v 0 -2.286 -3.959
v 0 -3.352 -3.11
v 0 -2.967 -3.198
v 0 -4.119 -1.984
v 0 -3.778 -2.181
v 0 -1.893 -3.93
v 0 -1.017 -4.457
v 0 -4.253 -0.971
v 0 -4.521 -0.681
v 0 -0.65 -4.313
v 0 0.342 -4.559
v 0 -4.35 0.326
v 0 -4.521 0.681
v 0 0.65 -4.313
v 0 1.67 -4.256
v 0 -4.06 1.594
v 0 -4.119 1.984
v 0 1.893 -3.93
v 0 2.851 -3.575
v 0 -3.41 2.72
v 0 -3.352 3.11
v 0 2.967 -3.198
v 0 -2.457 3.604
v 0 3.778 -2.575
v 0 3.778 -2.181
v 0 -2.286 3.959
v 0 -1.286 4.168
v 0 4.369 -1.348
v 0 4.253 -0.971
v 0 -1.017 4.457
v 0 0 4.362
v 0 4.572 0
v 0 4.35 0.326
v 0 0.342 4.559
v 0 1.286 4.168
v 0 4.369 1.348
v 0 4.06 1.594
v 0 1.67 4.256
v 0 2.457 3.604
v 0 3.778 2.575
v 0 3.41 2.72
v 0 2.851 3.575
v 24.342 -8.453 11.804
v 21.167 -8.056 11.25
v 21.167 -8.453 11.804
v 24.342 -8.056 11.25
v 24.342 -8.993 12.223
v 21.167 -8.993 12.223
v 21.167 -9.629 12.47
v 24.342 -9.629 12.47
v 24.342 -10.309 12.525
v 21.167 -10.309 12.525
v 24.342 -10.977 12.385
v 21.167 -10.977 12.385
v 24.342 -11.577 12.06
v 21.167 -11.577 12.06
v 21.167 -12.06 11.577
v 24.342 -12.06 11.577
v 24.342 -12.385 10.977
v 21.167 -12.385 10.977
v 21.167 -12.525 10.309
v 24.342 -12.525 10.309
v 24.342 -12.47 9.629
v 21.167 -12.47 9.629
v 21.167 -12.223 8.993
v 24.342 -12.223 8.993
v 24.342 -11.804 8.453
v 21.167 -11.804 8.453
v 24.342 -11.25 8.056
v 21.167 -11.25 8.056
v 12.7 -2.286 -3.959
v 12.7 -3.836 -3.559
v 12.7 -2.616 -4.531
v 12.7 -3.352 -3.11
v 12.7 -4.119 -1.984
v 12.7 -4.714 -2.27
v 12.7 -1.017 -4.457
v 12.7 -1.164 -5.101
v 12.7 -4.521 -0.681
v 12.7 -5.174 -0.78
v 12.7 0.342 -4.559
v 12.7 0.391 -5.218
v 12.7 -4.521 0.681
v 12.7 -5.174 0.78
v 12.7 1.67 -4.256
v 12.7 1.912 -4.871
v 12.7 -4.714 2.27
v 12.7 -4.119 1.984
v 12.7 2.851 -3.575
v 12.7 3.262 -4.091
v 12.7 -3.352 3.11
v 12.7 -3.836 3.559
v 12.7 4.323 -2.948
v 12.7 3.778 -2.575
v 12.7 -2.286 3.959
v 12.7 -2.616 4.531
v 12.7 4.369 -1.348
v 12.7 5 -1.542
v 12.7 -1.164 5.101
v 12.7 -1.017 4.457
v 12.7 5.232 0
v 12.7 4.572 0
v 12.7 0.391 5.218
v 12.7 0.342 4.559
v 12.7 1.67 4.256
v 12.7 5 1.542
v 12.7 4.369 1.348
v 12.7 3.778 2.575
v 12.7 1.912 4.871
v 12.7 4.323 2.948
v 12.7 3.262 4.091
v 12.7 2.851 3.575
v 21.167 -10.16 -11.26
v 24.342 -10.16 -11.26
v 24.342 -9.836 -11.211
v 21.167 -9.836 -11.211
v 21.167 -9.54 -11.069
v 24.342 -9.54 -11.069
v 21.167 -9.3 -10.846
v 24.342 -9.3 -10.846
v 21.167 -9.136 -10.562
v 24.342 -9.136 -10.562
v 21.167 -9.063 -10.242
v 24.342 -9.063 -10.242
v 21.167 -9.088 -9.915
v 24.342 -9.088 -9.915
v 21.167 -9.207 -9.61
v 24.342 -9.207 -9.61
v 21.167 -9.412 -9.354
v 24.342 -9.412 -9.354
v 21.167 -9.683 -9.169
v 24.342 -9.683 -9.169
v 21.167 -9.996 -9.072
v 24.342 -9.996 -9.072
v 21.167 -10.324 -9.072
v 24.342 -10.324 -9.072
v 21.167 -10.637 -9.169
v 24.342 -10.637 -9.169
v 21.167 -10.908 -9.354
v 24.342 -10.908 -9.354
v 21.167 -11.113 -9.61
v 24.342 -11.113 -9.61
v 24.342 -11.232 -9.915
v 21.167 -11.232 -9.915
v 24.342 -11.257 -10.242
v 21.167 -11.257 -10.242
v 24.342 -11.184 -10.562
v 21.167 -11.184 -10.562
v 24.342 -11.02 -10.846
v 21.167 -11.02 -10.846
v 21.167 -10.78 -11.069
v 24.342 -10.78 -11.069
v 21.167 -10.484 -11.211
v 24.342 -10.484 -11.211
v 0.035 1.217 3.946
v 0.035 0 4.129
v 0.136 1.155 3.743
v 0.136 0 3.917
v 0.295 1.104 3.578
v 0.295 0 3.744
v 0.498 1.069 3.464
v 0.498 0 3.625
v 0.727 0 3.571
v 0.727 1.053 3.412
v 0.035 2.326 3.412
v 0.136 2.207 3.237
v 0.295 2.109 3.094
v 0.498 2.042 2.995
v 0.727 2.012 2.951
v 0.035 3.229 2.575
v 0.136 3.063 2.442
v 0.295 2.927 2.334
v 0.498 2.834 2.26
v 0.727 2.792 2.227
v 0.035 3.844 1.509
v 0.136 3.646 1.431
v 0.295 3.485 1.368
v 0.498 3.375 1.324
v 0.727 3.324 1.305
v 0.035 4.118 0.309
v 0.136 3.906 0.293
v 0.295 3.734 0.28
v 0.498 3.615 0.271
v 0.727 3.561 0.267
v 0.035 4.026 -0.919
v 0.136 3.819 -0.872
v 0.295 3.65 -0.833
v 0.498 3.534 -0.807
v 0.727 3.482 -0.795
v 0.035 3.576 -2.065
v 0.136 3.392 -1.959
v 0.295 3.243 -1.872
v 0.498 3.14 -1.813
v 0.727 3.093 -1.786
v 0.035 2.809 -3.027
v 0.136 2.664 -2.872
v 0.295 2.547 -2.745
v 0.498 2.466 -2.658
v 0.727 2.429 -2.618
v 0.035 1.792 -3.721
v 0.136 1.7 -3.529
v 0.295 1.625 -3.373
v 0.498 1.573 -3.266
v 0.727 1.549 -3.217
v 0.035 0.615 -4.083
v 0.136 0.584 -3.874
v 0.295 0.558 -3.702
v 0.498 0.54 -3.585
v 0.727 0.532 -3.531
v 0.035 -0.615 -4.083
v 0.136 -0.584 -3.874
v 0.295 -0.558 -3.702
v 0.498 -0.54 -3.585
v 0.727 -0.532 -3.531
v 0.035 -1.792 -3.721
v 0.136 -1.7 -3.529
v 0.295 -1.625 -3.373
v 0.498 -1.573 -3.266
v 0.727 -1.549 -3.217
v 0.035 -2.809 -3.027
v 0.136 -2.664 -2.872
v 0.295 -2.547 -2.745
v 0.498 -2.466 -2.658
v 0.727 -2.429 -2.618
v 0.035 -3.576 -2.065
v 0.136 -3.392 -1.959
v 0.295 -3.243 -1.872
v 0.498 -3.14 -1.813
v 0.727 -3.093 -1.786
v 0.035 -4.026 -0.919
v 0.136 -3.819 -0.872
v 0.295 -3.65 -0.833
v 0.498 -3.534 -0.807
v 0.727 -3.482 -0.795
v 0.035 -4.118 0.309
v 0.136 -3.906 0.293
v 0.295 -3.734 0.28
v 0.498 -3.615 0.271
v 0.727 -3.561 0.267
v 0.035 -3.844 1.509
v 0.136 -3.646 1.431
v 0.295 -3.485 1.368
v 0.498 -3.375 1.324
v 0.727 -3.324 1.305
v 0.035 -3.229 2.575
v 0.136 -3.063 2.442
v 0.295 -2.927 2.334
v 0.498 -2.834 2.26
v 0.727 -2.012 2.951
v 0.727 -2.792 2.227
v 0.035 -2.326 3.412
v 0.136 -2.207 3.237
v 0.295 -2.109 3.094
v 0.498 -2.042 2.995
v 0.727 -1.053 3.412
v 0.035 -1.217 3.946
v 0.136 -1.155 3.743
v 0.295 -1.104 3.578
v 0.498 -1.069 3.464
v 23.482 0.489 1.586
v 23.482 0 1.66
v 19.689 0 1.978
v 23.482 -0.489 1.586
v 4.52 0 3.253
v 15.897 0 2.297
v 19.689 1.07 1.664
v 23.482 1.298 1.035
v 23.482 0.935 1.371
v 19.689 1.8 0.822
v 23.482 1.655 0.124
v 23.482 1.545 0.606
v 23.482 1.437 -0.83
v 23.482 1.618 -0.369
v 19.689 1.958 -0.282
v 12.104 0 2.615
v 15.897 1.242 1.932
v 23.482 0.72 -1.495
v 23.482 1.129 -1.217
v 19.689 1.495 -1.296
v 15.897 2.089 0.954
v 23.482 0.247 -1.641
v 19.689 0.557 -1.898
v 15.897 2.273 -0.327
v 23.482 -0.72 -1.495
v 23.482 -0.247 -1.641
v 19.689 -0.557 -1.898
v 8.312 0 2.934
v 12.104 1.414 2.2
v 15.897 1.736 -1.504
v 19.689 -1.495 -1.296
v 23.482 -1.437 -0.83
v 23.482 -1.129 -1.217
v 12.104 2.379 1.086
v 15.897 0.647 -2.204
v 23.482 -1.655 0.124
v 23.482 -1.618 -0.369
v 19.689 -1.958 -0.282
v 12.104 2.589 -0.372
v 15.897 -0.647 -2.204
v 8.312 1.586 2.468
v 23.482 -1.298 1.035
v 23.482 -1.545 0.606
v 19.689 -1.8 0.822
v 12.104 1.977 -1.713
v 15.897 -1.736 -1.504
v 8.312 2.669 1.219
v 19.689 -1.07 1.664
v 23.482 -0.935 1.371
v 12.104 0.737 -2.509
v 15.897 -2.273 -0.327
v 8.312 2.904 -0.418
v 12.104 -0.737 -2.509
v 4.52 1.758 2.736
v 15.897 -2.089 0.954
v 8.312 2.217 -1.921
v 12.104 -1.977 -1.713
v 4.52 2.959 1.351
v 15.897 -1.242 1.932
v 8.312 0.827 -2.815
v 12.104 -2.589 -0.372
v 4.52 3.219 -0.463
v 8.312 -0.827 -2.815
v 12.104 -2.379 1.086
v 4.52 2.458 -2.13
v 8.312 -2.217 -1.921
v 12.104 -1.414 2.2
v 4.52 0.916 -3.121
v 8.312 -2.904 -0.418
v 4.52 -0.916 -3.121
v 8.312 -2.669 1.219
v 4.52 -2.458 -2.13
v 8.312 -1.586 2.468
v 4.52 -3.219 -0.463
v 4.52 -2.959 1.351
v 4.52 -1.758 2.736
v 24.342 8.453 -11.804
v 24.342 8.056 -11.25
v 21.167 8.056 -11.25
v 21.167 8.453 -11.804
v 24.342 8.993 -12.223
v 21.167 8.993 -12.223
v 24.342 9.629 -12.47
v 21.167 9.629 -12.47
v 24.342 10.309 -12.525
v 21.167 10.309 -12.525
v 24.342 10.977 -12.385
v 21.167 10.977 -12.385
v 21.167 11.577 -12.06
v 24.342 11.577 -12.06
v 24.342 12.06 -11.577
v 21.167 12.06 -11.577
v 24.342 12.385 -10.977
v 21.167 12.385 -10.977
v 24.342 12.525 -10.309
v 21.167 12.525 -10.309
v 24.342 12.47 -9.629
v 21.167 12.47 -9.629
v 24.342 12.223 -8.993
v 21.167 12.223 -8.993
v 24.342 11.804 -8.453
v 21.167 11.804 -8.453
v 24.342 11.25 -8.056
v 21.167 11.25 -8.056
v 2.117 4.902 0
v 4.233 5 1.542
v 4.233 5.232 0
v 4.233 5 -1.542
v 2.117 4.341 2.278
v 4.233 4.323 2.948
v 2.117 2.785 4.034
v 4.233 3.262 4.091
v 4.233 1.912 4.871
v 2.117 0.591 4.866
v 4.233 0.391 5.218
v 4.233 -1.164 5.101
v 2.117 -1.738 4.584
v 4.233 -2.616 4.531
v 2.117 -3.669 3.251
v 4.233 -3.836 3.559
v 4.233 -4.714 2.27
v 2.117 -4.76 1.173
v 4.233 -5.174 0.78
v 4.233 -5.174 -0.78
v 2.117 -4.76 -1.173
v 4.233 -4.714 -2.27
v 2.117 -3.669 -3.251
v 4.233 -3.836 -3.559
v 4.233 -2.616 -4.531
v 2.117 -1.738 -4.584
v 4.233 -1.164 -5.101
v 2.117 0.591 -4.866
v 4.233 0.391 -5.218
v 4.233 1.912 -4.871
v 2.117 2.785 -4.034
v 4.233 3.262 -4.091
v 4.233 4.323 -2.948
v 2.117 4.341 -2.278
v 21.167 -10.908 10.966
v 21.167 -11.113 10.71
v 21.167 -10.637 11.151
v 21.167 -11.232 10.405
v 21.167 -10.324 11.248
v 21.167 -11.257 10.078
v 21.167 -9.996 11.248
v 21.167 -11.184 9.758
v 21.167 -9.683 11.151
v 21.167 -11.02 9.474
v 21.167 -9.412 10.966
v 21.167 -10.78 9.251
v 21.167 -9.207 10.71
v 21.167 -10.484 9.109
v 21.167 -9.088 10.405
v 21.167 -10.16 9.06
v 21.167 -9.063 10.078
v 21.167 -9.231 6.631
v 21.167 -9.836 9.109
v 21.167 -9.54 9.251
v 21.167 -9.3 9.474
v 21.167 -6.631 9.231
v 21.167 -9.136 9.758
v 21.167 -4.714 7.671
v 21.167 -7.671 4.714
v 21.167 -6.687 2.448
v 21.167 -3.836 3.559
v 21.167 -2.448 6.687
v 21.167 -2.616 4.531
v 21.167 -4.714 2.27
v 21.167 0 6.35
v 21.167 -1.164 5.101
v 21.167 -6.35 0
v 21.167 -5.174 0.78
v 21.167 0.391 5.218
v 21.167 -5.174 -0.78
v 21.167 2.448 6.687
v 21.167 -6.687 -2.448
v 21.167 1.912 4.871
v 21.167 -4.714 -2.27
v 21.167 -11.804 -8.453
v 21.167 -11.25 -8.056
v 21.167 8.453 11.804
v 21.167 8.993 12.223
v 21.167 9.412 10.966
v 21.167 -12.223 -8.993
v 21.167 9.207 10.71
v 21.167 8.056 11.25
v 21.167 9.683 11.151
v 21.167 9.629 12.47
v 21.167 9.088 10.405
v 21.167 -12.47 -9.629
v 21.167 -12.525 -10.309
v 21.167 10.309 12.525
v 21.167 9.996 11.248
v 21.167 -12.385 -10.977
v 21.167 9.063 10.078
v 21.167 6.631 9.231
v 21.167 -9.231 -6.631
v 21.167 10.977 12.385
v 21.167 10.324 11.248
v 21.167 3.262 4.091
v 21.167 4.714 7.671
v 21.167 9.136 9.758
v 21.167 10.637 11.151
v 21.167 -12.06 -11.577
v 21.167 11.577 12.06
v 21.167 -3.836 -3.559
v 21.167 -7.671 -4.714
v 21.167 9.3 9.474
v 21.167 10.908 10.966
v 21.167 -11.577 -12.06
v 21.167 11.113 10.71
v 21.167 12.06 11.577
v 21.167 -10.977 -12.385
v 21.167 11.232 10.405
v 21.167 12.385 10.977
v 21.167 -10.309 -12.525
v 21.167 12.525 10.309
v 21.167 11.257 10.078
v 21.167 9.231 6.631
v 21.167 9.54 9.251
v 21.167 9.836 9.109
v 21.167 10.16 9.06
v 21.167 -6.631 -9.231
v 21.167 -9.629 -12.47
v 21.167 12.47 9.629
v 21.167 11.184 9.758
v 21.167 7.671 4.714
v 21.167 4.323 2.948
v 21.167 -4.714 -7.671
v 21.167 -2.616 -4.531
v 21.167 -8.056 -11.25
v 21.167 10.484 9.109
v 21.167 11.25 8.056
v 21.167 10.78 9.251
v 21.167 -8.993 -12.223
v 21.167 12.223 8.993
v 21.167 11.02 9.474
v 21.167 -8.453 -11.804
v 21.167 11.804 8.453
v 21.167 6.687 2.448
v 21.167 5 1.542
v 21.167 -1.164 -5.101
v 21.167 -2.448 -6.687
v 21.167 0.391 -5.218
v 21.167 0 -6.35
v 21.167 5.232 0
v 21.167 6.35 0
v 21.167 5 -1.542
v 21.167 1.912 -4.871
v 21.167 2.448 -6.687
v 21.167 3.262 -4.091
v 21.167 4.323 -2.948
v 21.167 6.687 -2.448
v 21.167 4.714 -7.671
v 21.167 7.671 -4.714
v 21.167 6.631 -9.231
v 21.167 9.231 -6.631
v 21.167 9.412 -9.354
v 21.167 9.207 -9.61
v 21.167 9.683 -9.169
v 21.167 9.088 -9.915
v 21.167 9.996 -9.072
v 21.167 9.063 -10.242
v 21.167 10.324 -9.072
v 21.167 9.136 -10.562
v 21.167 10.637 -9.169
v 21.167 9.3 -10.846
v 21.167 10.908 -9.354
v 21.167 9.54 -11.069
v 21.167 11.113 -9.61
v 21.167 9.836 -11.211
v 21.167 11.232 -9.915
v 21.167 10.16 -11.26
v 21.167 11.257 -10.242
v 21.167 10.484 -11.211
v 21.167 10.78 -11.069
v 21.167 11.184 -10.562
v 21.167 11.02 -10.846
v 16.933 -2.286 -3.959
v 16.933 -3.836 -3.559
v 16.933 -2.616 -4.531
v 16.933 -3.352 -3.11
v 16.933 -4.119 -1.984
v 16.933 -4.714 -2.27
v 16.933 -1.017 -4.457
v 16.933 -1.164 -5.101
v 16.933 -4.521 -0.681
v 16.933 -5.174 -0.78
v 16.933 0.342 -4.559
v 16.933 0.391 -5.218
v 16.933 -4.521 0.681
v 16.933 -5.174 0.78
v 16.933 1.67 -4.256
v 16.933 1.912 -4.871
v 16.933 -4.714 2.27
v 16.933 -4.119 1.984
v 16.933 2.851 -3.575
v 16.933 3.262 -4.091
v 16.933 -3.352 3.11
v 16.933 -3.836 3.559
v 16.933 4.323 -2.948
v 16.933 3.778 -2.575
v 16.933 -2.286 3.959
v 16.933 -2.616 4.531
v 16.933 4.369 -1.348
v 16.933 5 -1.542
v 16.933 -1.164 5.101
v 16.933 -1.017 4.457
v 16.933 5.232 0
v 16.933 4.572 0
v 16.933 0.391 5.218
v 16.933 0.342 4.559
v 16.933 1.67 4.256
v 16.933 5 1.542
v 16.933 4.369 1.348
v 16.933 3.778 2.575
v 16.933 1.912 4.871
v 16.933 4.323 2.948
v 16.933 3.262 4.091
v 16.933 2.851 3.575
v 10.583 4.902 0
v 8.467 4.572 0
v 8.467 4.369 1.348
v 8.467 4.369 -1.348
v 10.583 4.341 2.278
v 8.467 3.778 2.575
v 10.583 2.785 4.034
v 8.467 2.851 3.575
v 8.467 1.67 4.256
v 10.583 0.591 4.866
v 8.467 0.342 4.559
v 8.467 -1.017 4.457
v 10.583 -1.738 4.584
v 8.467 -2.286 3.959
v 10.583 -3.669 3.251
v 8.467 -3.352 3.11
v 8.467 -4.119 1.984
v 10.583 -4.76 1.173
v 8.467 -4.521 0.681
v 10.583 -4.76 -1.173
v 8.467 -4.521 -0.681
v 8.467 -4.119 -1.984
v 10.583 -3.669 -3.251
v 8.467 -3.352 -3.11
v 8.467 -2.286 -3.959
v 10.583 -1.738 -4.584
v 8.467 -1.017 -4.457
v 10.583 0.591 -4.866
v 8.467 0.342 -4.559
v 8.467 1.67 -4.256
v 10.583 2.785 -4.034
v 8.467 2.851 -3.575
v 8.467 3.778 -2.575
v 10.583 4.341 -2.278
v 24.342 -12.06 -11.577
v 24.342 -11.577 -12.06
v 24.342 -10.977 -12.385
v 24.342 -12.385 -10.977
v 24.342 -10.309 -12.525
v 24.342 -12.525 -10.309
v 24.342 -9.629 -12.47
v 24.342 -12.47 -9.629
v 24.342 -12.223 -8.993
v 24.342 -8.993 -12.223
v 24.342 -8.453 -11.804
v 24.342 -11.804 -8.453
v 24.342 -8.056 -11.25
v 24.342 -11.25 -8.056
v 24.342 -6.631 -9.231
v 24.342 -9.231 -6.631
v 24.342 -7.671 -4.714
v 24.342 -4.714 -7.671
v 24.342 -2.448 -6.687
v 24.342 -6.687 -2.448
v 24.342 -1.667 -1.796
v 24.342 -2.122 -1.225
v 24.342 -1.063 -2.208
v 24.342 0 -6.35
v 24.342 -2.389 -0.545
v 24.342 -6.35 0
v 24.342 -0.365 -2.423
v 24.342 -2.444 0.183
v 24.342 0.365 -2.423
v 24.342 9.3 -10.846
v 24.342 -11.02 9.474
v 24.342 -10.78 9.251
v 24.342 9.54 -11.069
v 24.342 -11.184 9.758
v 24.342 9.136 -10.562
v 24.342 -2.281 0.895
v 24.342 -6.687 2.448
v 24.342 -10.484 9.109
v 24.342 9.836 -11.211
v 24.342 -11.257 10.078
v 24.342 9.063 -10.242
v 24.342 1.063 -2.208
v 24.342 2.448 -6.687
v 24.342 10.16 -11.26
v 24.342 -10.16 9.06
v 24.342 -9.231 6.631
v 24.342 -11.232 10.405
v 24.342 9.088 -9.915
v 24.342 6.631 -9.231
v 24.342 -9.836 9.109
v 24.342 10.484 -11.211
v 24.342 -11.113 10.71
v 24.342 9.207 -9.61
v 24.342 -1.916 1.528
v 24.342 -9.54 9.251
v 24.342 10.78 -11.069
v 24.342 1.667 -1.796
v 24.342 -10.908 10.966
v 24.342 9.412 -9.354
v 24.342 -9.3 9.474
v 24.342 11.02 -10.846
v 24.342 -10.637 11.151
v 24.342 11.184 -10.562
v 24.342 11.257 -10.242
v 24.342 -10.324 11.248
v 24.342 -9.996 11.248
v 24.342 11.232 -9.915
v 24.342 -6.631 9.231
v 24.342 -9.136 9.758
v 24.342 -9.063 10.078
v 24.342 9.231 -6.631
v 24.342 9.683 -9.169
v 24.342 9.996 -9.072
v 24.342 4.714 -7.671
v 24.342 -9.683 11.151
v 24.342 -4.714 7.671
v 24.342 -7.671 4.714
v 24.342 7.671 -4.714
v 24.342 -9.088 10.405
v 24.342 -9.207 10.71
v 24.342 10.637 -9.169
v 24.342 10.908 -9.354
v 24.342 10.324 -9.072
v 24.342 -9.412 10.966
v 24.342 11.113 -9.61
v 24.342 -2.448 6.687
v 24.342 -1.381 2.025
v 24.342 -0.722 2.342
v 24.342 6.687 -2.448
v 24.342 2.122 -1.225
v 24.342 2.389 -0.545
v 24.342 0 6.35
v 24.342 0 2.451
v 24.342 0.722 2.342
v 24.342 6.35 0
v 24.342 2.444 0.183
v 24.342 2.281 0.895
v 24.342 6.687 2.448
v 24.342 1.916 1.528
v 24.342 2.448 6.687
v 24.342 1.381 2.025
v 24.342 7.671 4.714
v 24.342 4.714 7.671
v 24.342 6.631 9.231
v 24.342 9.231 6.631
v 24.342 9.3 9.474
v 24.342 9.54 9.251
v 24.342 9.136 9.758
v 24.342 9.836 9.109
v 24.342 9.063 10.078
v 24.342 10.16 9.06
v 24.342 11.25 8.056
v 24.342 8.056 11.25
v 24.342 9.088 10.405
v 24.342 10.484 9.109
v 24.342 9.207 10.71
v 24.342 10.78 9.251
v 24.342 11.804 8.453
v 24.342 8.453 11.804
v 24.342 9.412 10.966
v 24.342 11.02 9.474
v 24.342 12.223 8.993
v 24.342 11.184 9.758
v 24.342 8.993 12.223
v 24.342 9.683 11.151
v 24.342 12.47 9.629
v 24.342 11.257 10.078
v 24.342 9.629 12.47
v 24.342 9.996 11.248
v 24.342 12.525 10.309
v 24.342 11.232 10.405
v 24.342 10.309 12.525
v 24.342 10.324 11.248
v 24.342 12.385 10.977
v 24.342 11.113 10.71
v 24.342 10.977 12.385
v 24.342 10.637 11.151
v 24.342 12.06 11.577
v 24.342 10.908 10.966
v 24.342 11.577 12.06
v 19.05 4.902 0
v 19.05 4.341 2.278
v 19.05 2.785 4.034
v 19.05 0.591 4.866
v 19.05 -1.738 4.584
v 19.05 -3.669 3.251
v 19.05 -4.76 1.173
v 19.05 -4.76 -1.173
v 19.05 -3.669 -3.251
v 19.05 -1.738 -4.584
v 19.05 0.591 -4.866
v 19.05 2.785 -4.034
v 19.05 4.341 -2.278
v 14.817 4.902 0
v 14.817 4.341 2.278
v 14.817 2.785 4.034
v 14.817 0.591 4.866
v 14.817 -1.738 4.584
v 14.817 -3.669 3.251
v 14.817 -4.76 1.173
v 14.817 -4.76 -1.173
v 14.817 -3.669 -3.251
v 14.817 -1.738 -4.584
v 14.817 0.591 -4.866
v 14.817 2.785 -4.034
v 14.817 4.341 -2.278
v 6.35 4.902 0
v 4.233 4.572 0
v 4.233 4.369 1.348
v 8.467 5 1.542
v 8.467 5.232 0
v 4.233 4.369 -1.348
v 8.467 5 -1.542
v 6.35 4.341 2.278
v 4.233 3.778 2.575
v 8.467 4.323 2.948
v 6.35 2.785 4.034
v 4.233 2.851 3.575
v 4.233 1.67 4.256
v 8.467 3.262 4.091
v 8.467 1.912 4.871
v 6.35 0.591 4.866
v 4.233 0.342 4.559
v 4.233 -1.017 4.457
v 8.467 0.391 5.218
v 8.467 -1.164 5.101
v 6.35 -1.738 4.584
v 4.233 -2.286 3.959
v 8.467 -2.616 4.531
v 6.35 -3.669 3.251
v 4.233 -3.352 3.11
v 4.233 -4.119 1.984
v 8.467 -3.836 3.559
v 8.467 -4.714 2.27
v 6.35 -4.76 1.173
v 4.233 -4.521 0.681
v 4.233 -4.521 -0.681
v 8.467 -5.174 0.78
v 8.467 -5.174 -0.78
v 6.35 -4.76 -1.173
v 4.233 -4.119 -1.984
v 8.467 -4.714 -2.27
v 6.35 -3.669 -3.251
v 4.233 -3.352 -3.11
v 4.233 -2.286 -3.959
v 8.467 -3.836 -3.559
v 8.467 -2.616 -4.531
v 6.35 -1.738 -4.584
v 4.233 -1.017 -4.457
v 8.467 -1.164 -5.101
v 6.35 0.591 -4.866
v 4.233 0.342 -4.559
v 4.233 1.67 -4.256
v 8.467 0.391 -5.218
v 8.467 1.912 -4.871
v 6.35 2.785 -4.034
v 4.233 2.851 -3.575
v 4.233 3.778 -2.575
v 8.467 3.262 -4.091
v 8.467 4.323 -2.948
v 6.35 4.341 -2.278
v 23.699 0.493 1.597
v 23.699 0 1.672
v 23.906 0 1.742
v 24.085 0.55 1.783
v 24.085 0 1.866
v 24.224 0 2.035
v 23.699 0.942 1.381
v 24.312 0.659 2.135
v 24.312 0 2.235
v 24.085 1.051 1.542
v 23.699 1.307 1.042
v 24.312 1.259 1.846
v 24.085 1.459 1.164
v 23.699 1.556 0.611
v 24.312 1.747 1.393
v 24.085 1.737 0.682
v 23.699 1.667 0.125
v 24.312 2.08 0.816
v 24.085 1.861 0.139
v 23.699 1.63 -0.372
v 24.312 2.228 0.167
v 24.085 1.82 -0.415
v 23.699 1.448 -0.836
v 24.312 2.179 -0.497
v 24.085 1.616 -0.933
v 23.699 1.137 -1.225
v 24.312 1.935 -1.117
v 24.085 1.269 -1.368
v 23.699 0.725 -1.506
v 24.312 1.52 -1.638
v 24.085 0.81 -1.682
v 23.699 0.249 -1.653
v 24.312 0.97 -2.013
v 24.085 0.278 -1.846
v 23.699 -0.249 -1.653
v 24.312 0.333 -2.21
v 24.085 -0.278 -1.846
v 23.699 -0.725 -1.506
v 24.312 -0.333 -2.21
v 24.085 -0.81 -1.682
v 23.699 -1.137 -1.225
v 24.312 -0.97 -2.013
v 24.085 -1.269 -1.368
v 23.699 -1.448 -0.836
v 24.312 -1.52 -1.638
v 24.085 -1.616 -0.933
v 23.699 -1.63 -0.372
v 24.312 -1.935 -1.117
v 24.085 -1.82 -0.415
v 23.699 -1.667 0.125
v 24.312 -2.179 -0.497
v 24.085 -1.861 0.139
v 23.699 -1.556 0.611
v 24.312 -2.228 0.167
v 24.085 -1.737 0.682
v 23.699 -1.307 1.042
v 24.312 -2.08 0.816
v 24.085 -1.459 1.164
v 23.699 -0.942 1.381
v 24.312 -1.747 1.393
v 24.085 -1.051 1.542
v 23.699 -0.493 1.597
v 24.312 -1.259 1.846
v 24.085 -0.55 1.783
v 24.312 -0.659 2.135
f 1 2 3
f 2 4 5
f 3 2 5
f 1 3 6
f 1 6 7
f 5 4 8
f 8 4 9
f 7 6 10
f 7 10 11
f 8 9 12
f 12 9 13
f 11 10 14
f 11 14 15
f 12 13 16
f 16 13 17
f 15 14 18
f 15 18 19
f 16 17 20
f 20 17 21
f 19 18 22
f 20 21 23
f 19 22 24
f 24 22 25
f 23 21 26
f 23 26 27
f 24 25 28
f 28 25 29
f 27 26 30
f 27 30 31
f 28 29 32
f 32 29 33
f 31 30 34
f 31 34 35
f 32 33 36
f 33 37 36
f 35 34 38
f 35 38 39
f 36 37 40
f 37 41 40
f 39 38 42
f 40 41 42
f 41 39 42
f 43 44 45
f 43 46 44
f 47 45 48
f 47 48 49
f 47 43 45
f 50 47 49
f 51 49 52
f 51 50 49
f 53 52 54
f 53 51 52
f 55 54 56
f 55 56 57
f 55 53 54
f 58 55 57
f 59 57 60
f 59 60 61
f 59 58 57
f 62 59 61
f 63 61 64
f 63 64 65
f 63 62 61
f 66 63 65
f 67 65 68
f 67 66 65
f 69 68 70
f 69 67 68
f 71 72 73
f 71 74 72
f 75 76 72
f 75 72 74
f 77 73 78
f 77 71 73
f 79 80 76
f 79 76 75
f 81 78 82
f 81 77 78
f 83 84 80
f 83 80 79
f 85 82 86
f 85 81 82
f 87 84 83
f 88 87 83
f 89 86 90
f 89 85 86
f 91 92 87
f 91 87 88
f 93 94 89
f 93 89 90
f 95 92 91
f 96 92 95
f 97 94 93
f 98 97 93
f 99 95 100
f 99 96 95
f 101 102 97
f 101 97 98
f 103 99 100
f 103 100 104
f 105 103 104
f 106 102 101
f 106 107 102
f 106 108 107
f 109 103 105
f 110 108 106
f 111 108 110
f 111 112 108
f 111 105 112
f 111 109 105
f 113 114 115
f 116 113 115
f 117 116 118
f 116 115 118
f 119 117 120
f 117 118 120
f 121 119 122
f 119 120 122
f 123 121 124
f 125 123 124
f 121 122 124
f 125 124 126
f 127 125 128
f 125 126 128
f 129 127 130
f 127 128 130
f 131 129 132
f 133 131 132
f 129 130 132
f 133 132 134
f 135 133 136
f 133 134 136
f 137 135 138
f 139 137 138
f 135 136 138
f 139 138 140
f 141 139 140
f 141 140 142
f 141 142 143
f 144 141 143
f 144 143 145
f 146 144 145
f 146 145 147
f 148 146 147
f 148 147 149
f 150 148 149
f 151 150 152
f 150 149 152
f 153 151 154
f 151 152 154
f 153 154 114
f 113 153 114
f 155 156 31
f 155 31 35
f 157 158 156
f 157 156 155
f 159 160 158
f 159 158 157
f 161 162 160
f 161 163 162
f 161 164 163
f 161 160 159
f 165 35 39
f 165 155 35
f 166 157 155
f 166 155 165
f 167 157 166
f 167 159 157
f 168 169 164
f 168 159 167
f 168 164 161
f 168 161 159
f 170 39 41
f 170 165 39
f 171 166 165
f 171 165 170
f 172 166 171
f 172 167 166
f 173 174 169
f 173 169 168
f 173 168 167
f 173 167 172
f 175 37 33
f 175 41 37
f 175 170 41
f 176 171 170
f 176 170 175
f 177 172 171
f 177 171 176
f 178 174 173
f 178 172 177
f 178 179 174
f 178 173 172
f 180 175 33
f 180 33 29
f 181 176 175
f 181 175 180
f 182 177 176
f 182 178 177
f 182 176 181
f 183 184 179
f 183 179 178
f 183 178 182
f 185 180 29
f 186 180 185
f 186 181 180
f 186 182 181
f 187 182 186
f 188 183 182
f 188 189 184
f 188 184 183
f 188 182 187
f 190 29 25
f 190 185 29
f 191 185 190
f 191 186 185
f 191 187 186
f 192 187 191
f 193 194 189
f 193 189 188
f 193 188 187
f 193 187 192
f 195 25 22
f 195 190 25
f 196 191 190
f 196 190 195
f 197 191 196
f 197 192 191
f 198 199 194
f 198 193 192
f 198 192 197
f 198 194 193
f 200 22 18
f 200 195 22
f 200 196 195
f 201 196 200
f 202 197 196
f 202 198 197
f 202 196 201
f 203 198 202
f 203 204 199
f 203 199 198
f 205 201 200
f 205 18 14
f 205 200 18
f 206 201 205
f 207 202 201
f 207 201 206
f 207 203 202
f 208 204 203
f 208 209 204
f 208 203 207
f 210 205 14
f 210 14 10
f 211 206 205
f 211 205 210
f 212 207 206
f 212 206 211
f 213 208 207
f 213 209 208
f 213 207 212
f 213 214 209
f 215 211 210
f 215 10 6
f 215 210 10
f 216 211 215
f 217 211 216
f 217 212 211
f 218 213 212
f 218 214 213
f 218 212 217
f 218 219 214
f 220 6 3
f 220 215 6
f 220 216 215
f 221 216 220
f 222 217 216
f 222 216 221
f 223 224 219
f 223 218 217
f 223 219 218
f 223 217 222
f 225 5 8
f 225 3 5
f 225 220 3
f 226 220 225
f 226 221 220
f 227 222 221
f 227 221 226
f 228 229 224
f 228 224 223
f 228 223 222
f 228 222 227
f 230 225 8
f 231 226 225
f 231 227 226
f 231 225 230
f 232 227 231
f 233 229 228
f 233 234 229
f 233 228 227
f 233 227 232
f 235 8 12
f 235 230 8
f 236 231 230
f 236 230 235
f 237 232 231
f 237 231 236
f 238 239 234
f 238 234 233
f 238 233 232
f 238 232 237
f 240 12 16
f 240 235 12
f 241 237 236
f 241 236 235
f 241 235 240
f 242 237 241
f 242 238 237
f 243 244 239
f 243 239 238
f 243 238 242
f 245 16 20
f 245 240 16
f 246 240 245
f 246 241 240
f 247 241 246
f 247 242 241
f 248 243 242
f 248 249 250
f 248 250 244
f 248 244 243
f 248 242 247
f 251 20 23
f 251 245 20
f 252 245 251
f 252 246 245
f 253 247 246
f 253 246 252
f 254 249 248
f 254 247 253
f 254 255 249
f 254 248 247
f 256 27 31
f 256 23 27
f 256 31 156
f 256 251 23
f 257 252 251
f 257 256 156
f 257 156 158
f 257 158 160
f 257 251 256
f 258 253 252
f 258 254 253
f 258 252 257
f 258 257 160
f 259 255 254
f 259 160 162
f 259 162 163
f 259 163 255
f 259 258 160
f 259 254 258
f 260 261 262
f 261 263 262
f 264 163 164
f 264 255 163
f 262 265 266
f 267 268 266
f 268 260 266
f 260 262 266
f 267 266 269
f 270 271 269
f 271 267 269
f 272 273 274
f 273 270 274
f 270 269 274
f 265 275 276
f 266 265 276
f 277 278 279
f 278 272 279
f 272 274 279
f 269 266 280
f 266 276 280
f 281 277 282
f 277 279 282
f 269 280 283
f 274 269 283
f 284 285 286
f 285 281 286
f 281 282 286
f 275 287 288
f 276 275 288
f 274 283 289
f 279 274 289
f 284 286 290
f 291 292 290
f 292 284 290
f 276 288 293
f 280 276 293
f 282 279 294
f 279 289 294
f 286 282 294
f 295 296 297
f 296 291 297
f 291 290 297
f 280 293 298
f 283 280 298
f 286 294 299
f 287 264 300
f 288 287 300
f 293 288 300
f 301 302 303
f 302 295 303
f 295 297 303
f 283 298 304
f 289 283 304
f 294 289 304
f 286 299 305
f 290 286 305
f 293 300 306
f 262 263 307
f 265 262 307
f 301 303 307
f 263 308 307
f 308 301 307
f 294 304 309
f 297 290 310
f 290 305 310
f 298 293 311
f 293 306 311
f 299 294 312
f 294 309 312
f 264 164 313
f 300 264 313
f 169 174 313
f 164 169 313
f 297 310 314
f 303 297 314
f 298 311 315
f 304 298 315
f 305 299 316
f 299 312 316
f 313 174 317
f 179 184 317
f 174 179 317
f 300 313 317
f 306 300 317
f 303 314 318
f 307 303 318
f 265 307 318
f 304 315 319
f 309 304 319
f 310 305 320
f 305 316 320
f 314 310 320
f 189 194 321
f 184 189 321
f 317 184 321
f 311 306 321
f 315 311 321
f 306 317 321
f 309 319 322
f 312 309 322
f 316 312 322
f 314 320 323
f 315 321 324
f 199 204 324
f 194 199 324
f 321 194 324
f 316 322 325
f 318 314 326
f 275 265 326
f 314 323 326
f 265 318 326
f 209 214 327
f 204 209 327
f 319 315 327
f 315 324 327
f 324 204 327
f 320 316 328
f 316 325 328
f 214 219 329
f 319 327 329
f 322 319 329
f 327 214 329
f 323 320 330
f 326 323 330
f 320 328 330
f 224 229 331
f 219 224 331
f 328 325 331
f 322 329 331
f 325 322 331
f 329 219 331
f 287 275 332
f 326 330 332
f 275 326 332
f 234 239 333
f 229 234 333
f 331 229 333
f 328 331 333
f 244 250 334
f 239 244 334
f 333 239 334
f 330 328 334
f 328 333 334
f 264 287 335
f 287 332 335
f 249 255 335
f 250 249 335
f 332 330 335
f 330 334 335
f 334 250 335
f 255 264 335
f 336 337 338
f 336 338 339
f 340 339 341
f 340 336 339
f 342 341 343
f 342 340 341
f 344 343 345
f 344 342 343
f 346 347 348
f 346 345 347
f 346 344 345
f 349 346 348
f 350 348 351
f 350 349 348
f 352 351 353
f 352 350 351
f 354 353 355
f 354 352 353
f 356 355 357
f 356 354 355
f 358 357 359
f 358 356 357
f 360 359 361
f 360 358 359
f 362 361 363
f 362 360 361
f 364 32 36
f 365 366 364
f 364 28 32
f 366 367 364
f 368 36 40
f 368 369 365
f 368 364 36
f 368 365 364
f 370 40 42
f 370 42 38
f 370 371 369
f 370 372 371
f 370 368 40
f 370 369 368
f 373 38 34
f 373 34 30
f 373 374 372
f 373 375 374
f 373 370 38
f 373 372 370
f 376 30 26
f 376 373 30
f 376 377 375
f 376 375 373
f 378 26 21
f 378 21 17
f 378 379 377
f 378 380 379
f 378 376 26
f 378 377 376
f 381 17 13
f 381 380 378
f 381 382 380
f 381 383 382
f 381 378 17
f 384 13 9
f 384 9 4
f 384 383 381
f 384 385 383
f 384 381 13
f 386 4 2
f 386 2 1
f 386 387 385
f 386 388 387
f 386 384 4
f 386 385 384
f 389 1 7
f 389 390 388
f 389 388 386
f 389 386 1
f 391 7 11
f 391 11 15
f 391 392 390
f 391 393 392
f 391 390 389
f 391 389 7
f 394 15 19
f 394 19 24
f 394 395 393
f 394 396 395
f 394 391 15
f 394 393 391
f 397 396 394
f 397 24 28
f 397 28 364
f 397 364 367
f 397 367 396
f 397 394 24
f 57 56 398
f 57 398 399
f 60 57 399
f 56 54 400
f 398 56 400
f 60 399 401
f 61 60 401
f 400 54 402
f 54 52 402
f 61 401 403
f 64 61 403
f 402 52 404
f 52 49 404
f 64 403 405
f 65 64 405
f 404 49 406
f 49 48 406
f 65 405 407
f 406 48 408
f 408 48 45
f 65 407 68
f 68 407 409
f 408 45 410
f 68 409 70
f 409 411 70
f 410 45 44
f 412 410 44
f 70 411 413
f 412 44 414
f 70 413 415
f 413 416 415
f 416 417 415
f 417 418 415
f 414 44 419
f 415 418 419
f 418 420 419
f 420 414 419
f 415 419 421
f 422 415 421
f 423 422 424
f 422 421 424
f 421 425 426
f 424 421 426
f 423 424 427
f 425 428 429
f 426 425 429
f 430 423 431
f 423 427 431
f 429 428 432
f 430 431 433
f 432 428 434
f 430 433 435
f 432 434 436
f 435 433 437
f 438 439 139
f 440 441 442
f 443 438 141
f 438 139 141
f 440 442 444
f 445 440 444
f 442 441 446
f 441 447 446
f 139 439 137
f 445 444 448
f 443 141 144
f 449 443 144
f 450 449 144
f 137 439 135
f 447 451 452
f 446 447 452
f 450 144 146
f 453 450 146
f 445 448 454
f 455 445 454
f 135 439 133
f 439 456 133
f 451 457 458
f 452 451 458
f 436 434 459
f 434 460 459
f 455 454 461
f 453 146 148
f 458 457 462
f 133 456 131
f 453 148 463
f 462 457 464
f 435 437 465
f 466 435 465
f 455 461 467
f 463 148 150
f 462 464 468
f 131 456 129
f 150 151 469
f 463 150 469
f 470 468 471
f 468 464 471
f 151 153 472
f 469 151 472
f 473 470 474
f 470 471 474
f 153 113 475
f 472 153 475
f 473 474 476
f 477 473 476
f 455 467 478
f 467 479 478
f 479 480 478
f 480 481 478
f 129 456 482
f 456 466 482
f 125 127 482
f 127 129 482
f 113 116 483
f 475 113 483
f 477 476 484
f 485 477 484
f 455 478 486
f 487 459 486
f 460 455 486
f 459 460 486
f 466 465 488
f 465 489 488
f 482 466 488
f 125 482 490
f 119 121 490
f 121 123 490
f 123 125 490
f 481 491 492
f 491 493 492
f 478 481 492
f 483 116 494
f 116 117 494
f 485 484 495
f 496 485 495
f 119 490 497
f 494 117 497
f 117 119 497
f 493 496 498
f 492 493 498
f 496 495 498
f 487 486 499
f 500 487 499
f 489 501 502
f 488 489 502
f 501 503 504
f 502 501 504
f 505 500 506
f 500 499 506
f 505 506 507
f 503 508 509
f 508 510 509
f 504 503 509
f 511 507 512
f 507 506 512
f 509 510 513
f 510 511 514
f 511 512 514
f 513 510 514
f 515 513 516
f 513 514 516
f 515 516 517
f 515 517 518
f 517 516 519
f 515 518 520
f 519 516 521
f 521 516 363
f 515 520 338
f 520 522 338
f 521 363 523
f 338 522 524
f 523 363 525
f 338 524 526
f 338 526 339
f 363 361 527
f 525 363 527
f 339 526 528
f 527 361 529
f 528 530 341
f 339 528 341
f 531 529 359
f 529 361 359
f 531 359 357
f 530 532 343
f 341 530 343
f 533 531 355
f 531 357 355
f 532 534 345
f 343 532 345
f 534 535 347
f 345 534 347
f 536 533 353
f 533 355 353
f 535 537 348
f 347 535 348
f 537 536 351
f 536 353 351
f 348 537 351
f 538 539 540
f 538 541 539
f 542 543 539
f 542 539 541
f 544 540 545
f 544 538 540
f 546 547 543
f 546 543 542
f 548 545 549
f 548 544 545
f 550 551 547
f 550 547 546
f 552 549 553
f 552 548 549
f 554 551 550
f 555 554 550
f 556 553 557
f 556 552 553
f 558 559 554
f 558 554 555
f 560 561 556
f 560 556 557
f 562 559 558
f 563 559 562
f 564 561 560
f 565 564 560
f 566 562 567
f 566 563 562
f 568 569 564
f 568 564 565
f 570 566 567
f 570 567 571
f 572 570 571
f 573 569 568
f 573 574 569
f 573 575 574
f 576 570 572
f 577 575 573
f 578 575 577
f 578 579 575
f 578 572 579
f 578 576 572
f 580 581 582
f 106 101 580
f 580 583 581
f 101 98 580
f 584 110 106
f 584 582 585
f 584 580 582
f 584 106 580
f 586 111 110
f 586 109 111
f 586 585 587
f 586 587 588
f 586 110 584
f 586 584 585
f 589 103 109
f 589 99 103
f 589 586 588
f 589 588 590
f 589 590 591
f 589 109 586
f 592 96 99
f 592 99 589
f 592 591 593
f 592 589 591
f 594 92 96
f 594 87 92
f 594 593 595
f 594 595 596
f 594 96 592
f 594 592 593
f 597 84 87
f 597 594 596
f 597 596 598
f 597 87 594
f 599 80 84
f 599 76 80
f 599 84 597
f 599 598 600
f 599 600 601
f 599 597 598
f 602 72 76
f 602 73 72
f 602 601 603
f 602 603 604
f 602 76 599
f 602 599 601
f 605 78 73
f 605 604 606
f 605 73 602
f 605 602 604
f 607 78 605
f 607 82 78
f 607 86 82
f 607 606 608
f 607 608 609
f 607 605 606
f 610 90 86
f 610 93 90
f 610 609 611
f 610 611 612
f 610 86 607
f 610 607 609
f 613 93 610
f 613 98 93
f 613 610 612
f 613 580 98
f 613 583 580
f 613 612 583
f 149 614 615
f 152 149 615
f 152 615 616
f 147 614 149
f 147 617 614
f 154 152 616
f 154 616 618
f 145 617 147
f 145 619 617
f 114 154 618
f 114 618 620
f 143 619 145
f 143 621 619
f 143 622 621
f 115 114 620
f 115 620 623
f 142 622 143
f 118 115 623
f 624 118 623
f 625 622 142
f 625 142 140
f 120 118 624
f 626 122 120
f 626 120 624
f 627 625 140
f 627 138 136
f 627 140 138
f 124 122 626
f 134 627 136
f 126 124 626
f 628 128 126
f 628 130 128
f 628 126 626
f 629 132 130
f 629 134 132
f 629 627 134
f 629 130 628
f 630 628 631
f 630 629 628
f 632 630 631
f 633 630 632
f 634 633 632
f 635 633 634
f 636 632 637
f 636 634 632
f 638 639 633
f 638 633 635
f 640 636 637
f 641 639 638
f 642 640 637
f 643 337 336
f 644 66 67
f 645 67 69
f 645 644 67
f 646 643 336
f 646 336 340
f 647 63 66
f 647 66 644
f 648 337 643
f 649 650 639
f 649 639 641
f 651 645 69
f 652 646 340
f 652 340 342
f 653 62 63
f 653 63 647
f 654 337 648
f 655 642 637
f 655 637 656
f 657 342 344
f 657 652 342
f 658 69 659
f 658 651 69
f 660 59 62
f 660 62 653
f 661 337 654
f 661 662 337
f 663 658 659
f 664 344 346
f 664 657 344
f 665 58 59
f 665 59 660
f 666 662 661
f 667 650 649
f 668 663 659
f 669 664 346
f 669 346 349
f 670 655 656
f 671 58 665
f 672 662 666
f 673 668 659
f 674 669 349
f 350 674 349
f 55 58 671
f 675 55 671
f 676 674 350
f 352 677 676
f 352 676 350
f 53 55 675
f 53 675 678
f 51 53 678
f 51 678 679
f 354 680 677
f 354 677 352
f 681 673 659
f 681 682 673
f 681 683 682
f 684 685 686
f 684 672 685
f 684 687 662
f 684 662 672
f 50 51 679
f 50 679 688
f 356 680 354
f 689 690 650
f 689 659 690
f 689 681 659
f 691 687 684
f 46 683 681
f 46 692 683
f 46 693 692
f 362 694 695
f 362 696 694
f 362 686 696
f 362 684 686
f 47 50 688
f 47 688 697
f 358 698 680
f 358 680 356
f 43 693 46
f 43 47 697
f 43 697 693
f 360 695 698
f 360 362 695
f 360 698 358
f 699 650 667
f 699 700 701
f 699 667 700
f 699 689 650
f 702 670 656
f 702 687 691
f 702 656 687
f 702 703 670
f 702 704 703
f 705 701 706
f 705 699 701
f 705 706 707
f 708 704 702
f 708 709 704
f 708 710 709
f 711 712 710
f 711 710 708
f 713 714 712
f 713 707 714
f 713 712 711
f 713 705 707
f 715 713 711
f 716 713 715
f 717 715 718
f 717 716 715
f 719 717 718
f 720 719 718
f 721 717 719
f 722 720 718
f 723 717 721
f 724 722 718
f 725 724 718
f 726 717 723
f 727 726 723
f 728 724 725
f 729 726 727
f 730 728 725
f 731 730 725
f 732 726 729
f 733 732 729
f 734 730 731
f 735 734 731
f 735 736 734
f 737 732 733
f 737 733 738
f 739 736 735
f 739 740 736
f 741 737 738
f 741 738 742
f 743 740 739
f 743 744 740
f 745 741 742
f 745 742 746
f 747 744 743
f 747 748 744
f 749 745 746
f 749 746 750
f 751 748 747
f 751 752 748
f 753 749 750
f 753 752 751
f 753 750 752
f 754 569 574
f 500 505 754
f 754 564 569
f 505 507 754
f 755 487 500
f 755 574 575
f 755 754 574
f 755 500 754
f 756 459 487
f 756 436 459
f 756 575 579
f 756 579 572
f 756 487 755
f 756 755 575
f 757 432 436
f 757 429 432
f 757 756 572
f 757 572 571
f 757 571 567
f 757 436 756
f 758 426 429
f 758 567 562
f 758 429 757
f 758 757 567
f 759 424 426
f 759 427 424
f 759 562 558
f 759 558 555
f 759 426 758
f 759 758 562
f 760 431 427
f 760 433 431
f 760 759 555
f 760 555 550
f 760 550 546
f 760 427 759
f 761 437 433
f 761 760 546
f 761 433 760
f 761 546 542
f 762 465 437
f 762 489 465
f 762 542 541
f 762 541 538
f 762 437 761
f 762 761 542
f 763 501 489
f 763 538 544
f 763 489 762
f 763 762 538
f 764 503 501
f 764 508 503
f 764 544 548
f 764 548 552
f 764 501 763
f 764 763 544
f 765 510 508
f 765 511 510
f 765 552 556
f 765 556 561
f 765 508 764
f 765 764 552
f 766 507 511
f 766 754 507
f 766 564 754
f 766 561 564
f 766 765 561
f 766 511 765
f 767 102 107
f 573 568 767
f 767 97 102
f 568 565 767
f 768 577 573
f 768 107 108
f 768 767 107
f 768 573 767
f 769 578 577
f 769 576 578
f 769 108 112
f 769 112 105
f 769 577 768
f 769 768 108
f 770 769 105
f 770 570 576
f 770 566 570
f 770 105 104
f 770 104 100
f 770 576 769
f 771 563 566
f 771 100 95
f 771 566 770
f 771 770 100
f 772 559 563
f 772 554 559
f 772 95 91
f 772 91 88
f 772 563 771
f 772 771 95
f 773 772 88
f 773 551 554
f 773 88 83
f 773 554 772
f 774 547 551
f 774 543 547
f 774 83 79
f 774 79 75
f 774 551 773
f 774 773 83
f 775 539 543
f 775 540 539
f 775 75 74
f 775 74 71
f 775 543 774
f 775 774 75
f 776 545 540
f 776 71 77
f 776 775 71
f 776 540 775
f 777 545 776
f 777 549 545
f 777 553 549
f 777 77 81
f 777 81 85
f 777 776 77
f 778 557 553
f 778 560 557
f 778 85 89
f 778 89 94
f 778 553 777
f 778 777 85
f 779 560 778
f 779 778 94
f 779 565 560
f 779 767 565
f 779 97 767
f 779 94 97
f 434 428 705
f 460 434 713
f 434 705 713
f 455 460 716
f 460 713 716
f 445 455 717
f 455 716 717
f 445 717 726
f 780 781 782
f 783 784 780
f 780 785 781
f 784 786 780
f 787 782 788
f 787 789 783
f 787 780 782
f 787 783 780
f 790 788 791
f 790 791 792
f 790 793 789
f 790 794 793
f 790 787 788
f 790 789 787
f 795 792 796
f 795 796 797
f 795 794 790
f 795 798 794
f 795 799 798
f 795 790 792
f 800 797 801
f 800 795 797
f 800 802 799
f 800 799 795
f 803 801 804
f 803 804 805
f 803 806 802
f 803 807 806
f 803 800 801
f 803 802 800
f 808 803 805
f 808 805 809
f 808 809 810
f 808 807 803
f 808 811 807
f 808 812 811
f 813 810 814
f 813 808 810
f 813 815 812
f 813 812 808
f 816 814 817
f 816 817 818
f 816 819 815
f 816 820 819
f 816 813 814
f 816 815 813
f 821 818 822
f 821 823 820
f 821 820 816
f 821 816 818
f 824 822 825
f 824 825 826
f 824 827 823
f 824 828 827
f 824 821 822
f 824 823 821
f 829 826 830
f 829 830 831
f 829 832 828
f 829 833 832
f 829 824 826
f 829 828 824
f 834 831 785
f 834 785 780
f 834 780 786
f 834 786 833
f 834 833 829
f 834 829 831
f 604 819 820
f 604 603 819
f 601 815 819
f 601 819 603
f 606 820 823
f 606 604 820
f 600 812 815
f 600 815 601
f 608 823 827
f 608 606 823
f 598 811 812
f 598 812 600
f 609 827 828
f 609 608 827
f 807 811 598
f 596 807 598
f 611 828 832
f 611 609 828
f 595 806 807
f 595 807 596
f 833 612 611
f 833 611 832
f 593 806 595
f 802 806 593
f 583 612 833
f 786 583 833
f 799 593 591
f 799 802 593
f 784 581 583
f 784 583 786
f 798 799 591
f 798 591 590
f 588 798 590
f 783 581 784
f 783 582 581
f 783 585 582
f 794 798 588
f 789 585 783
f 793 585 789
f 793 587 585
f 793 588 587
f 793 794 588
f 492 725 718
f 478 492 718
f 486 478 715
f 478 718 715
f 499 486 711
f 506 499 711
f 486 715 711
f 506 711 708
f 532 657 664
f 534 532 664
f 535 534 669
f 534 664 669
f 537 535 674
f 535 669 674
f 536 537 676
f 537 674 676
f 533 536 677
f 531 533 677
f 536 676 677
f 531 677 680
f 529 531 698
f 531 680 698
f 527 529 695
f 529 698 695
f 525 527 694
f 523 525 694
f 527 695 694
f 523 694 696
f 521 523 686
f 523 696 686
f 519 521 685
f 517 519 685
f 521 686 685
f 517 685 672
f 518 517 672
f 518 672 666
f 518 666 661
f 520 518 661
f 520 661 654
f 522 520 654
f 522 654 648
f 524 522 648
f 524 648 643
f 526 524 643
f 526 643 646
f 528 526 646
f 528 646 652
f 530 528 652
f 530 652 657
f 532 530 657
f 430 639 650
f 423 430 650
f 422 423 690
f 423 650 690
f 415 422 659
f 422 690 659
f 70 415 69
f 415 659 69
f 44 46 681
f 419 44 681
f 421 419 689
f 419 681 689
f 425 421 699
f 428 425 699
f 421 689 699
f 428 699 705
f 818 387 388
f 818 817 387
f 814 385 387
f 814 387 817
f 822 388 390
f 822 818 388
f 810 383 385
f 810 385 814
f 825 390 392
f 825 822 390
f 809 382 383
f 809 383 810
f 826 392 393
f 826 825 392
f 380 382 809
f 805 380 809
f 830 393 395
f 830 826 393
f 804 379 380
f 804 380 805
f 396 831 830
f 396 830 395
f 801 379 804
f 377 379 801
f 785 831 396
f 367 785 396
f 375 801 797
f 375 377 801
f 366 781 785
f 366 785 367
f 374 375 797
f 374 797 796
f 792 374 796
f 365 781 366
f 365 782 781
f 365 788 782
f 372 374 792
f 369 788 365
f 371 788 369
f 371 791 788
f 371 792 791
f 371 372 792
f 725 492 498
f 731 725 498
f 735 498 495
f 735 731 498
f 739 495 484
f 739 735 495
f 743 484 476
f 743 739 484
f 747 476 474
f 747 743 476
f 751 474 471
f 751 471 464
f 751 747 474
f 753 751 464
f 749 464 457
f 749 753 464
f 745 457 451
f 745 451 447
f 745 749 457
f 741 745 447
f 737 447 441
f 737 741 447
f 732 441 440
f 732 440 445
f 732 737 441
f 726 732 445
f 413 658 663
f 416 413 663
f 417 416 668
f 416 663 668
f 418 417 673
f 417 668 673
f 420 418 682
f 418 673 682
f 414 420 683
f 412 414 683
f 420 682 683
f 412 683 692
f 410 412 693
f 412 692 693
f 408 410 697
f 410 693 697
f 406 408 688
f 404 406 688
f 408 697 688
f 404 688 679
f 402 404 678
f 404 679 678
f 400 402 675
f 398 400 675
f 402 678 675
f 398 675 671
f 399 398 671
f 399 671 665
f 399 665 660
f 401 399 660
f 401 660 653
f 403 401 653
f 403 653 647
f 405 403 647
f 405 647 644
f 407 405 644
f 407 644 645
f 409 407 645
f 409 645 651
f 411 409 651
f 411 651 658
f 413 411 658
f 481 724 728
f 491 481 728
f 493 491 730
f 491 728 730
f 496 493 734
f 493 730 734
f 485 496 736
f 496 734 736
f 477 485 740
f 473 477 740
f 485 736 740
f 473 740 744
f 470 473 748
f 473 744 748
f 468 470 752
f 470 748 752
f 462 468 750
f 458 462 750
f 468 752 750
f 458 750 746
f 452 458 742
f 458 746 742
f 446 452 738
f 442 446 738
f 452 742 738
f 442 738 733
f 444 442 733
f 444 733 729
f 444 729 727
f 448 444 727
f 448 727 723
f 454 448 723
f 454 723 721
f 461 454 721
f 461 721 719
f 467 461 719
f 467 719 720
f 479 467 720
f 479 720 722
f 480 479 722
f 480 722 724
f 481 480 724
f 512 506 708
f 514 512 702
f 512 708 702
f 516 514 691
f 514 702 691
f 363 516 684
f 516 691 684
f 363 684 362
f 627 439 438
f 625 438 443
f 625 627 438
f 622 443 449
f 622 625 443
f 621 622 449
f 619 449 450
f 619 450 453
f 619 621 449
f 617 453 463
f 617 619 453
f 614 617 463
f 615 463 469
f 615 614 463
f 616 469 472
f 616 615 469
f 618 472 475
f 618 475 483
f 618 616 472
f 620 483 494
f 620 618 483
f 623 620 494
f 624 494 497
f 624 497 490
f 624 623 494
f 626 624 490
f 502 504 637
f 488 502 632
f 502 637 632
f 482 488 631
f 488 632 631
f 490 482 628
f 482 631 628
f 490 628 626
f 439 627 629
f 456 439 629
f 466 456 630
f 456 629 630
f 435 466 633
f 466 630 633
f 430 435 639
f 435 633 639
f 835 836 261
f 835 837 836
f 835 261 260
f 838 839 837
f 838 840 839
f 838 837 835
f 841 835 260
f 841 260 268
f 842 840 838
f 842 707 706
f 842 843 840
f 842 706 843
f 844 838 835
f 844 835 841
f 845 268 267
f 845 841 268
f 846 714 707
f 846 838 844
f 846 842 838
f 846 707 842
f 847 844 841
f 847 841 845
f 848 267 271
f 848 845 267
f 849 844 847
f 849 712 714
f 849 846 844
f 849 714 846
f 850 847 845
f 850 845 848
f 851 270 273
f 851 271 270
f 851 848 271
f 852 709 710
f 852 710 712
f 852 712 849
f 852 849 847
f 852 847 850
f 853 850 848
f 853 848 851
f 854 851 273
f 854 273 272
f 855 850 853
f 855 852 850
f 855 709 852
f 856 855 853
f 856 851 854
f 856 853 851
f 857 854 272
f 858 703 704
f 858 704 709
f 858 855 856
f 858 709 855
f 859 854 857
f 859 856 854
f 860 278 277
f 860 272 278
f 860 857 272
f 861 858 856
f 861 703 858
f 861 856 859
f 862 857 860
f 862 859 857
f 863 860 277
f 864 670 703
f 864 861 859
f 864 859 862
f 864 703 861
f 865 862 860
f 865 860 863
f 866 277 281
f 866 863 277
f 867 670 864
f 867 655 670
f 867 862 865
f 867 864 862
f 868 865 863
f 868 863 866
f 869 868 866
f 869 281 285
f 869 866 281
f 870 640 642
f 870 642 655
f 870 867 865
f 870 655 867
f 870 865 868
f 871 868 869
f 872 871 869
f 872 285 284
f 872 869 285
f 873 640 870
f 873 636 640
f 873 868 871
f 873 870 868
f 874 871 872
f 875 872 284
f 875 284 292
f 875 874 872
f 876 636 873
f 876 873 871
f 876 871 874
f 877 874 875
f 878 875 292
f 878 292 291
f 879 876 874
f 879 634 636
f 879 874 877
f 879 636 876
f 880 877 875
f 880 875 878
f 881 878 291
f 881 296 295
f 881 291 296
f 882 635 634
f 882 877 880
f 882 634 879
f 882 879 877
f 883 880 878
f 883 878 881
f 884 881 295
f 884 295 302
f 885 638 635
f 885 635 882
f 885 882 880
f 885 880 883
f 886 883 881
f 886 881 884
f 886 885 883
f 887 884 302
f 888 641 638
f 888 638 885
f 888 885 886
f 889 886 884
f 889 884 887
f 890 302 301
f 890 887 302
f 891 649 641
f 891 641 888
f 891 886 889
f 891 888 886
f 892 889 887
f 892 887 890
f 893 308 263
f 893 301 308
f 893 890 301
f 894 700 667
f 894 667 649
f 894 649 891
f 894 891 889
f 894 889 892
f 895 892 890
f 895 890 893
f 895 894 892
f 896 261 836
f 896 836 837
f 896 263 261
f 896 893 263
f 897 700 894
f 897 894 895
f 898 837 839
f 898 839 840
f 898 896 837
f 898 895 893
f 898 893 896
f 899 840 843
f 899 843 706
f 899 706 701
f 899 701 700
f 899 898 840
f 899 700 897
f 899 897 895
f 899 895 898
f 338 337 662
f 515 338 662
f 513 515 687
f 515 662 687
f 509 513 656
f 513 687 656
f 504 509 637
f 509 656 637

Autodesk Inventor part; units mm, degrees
ref_plane "YZ Plane" through (0, 0, 0) normal (1, 0, 0) x (0, 1, 0)
ref_plane "XZ Plane" through (0, 0, 0) normal (0, 1, 0) x (-1, 0, 0)
ref_plane "XY Plane" through (0, 0, 0) normal (0, 0, 1) x (1, 0, 0)
sketch "Sketch3" plane through (0, 0, 0) normal (0, 0, 1) x (1, 0, 0)
  line L0 (0, 0) -> (0, 4.572)
  line L1 (0, 4.572) -> (4.2333, 5.2324)
  line L2 (0, 0) -> (21.1667, 0)
  line L3 (4.2333, 5.2324) -> (4.2333, 4.572)
  line L4 (4.2333, 4.572) -> (8.4667, 5.2324)
  line L5 (8.4667, 5.2324) -> (8.4667, 4.572)
  line L6 (8.4667, 4.572) -> (12.7, 5.2324)
  line L7 (12.7, 5.2324) -> (12.7, 4.572)
  line L8 (12.7, 4.572) -> (16.9333, 5.2324)
  line L9 (16.9333, 5.2324) -> (16.9333, 4.572)
  line L10 (16.9333, 4.572) -> (21.1667, 5.2324)
  line L11 (21.1667, 5.2324) -> (21.1667, 0)
  line L12 (21.1667, 0) -> (24.3417, 0)
  line L13 (24.3417, 0) -> (24.3417, 6.35)
  line L14 (24.3417, 6.35) -> (21.1667, 6.35)
  line L15 (21.1667, 6.35) -> (21.1667, 0)
  dimension "d4" = 4.572
  dimension "d6" = 5.2324
  dimension "d7" = 4.2333
  dimension "d8" = 3.175
  dimension "d9" = 6.35
revolve "Revolution1" add sketch "Sketch3" angle 360 about axis through (0, 0, 0) along (1, 0, 0)
sketch "Sketch4" plane through (0, 0, 0) normal (-1, 0, 0) x (0, 0, 1)
  circle A0 centre (0, 0) radius 3.6322
  dimension "d11" = 7.2644
sketch "Sketch5" plane through (24.3417, 0, 0) normal (1, 0, 0) x (0, 0, -1)
  circle A0 centre (0, 0) radius 1.5875
  dimension "d15" = 3.175
loft "Loft1" cut profiles "Sketch4", "Sketch5"
fillet "Fillet2" radius 0.7937 1 edges at (0, 0, -3.6322)
sketch "Sketch6" plane through (24.3417, 0, 0) normal (1, 0, 0) x (0, 0, -1)
  circle A0 centre (0, 0) radius 6.35 projected
  line L0 (-10.16, 10.16) -> (10.16, 10.16) construction
  line L1 (10.16, 10.16) -> (10.16, -10.16) construction
  line L2 (10.16, -10.16) -> (-10.16, -10.16) construction
  line L3 (-10.16, -10.16) -> (-10.16, 10.16) construction
  line L4 (-10.16, 10.16) -> (10.16, -10.16) construction
  line L5 (-10.16, -10.16) -> (10.16, 10.16) construction
  circle A1 centre (-10.16, 10.16) radius 1.1
  circle A2 centre (10.16, 10.16) radius 1.1
  circle A3 centre (10.16, -10.16) radius 1.1
  circle A4 centre (-10.16, -10.16) radius 1.1
  circle A5 centre (-10.16, 10.16) radius 2.37
  circle A6 centre (10.16, 10.16) radius 2.37
  circle A7 centre (10.16, -10.16) radius 2.37
  circle A8 centre (-10.16, -10.16) radius 2.37
  arc A9 (-6.35, 0) -> (-11.2499, 8.0555) centre (-15.4216, 0) ccw
  arc A10 (-8.0555, 11.2499) -> (0, 6.35) centre (0, 15.4216) ccw
  arc A11 (0, -6.35) -> (-8.0555, -11.2499) centre (0, -15.4216) ccw
  arc A12 (-11.2499, -8.0555) -> (-6.35, 0) centre (-15.4216, 0) ccw
  arc A13 (6.35, 0) -> (11.2499, -8.0555) centre (15.4216, 0) ccw
  arc A14 (8.0555, -11.2499) -> (0, -6.35) centre (0, -15.4216) ccw
  arc A15 (0, 6.35) -> (8.0555, 11.2499) centre (0, 15.4216) ccw
  arc A16 (11.2499, 8.0555) -> (6.35, 0) centre (15.4216, 0) ccw
  point P0 (0, 0)
  point P1 (6.35, 0)
  point P2 (6.35, 0)
  point P3 (6.35, 0)
  point P4 (8.0555, 11.2499)
  point P5 (0, 6.35)
  point P6 (0, 6.35)
  point P7 (0, -6.35)
  point P8 (0, -6.35)
  point P9 (0, -6.35)
  point P10 (8.0555, -11.2499)
  point P11 (11.2499, -8.0555)
  point P12 (-6.35, 0)
  point P13 (-6.35, 0)
  point P14 (-11.2499, -8.0555)
  point P15 (-8.0555, -11.2499)
  dimension "d21" = 20.32
  dimension "d22" = 2.2
  dimension "d23" = 1.27
  dimension "d26" = 360
extrude "Extrusion3" add sketch "Sketch6" against normal blind 3.175 contours A13 A7 A14 A0 | A0 A15 A6 A16 | A0 A9 A5 A10 | A11 A8 A12 A0 | A7 | A6 | A5 | A8
fillet "Fillet3" radius 0.7937 1 edges at (24.3417, 0, -1.5875)
properties part number "NozzleAdapter"
